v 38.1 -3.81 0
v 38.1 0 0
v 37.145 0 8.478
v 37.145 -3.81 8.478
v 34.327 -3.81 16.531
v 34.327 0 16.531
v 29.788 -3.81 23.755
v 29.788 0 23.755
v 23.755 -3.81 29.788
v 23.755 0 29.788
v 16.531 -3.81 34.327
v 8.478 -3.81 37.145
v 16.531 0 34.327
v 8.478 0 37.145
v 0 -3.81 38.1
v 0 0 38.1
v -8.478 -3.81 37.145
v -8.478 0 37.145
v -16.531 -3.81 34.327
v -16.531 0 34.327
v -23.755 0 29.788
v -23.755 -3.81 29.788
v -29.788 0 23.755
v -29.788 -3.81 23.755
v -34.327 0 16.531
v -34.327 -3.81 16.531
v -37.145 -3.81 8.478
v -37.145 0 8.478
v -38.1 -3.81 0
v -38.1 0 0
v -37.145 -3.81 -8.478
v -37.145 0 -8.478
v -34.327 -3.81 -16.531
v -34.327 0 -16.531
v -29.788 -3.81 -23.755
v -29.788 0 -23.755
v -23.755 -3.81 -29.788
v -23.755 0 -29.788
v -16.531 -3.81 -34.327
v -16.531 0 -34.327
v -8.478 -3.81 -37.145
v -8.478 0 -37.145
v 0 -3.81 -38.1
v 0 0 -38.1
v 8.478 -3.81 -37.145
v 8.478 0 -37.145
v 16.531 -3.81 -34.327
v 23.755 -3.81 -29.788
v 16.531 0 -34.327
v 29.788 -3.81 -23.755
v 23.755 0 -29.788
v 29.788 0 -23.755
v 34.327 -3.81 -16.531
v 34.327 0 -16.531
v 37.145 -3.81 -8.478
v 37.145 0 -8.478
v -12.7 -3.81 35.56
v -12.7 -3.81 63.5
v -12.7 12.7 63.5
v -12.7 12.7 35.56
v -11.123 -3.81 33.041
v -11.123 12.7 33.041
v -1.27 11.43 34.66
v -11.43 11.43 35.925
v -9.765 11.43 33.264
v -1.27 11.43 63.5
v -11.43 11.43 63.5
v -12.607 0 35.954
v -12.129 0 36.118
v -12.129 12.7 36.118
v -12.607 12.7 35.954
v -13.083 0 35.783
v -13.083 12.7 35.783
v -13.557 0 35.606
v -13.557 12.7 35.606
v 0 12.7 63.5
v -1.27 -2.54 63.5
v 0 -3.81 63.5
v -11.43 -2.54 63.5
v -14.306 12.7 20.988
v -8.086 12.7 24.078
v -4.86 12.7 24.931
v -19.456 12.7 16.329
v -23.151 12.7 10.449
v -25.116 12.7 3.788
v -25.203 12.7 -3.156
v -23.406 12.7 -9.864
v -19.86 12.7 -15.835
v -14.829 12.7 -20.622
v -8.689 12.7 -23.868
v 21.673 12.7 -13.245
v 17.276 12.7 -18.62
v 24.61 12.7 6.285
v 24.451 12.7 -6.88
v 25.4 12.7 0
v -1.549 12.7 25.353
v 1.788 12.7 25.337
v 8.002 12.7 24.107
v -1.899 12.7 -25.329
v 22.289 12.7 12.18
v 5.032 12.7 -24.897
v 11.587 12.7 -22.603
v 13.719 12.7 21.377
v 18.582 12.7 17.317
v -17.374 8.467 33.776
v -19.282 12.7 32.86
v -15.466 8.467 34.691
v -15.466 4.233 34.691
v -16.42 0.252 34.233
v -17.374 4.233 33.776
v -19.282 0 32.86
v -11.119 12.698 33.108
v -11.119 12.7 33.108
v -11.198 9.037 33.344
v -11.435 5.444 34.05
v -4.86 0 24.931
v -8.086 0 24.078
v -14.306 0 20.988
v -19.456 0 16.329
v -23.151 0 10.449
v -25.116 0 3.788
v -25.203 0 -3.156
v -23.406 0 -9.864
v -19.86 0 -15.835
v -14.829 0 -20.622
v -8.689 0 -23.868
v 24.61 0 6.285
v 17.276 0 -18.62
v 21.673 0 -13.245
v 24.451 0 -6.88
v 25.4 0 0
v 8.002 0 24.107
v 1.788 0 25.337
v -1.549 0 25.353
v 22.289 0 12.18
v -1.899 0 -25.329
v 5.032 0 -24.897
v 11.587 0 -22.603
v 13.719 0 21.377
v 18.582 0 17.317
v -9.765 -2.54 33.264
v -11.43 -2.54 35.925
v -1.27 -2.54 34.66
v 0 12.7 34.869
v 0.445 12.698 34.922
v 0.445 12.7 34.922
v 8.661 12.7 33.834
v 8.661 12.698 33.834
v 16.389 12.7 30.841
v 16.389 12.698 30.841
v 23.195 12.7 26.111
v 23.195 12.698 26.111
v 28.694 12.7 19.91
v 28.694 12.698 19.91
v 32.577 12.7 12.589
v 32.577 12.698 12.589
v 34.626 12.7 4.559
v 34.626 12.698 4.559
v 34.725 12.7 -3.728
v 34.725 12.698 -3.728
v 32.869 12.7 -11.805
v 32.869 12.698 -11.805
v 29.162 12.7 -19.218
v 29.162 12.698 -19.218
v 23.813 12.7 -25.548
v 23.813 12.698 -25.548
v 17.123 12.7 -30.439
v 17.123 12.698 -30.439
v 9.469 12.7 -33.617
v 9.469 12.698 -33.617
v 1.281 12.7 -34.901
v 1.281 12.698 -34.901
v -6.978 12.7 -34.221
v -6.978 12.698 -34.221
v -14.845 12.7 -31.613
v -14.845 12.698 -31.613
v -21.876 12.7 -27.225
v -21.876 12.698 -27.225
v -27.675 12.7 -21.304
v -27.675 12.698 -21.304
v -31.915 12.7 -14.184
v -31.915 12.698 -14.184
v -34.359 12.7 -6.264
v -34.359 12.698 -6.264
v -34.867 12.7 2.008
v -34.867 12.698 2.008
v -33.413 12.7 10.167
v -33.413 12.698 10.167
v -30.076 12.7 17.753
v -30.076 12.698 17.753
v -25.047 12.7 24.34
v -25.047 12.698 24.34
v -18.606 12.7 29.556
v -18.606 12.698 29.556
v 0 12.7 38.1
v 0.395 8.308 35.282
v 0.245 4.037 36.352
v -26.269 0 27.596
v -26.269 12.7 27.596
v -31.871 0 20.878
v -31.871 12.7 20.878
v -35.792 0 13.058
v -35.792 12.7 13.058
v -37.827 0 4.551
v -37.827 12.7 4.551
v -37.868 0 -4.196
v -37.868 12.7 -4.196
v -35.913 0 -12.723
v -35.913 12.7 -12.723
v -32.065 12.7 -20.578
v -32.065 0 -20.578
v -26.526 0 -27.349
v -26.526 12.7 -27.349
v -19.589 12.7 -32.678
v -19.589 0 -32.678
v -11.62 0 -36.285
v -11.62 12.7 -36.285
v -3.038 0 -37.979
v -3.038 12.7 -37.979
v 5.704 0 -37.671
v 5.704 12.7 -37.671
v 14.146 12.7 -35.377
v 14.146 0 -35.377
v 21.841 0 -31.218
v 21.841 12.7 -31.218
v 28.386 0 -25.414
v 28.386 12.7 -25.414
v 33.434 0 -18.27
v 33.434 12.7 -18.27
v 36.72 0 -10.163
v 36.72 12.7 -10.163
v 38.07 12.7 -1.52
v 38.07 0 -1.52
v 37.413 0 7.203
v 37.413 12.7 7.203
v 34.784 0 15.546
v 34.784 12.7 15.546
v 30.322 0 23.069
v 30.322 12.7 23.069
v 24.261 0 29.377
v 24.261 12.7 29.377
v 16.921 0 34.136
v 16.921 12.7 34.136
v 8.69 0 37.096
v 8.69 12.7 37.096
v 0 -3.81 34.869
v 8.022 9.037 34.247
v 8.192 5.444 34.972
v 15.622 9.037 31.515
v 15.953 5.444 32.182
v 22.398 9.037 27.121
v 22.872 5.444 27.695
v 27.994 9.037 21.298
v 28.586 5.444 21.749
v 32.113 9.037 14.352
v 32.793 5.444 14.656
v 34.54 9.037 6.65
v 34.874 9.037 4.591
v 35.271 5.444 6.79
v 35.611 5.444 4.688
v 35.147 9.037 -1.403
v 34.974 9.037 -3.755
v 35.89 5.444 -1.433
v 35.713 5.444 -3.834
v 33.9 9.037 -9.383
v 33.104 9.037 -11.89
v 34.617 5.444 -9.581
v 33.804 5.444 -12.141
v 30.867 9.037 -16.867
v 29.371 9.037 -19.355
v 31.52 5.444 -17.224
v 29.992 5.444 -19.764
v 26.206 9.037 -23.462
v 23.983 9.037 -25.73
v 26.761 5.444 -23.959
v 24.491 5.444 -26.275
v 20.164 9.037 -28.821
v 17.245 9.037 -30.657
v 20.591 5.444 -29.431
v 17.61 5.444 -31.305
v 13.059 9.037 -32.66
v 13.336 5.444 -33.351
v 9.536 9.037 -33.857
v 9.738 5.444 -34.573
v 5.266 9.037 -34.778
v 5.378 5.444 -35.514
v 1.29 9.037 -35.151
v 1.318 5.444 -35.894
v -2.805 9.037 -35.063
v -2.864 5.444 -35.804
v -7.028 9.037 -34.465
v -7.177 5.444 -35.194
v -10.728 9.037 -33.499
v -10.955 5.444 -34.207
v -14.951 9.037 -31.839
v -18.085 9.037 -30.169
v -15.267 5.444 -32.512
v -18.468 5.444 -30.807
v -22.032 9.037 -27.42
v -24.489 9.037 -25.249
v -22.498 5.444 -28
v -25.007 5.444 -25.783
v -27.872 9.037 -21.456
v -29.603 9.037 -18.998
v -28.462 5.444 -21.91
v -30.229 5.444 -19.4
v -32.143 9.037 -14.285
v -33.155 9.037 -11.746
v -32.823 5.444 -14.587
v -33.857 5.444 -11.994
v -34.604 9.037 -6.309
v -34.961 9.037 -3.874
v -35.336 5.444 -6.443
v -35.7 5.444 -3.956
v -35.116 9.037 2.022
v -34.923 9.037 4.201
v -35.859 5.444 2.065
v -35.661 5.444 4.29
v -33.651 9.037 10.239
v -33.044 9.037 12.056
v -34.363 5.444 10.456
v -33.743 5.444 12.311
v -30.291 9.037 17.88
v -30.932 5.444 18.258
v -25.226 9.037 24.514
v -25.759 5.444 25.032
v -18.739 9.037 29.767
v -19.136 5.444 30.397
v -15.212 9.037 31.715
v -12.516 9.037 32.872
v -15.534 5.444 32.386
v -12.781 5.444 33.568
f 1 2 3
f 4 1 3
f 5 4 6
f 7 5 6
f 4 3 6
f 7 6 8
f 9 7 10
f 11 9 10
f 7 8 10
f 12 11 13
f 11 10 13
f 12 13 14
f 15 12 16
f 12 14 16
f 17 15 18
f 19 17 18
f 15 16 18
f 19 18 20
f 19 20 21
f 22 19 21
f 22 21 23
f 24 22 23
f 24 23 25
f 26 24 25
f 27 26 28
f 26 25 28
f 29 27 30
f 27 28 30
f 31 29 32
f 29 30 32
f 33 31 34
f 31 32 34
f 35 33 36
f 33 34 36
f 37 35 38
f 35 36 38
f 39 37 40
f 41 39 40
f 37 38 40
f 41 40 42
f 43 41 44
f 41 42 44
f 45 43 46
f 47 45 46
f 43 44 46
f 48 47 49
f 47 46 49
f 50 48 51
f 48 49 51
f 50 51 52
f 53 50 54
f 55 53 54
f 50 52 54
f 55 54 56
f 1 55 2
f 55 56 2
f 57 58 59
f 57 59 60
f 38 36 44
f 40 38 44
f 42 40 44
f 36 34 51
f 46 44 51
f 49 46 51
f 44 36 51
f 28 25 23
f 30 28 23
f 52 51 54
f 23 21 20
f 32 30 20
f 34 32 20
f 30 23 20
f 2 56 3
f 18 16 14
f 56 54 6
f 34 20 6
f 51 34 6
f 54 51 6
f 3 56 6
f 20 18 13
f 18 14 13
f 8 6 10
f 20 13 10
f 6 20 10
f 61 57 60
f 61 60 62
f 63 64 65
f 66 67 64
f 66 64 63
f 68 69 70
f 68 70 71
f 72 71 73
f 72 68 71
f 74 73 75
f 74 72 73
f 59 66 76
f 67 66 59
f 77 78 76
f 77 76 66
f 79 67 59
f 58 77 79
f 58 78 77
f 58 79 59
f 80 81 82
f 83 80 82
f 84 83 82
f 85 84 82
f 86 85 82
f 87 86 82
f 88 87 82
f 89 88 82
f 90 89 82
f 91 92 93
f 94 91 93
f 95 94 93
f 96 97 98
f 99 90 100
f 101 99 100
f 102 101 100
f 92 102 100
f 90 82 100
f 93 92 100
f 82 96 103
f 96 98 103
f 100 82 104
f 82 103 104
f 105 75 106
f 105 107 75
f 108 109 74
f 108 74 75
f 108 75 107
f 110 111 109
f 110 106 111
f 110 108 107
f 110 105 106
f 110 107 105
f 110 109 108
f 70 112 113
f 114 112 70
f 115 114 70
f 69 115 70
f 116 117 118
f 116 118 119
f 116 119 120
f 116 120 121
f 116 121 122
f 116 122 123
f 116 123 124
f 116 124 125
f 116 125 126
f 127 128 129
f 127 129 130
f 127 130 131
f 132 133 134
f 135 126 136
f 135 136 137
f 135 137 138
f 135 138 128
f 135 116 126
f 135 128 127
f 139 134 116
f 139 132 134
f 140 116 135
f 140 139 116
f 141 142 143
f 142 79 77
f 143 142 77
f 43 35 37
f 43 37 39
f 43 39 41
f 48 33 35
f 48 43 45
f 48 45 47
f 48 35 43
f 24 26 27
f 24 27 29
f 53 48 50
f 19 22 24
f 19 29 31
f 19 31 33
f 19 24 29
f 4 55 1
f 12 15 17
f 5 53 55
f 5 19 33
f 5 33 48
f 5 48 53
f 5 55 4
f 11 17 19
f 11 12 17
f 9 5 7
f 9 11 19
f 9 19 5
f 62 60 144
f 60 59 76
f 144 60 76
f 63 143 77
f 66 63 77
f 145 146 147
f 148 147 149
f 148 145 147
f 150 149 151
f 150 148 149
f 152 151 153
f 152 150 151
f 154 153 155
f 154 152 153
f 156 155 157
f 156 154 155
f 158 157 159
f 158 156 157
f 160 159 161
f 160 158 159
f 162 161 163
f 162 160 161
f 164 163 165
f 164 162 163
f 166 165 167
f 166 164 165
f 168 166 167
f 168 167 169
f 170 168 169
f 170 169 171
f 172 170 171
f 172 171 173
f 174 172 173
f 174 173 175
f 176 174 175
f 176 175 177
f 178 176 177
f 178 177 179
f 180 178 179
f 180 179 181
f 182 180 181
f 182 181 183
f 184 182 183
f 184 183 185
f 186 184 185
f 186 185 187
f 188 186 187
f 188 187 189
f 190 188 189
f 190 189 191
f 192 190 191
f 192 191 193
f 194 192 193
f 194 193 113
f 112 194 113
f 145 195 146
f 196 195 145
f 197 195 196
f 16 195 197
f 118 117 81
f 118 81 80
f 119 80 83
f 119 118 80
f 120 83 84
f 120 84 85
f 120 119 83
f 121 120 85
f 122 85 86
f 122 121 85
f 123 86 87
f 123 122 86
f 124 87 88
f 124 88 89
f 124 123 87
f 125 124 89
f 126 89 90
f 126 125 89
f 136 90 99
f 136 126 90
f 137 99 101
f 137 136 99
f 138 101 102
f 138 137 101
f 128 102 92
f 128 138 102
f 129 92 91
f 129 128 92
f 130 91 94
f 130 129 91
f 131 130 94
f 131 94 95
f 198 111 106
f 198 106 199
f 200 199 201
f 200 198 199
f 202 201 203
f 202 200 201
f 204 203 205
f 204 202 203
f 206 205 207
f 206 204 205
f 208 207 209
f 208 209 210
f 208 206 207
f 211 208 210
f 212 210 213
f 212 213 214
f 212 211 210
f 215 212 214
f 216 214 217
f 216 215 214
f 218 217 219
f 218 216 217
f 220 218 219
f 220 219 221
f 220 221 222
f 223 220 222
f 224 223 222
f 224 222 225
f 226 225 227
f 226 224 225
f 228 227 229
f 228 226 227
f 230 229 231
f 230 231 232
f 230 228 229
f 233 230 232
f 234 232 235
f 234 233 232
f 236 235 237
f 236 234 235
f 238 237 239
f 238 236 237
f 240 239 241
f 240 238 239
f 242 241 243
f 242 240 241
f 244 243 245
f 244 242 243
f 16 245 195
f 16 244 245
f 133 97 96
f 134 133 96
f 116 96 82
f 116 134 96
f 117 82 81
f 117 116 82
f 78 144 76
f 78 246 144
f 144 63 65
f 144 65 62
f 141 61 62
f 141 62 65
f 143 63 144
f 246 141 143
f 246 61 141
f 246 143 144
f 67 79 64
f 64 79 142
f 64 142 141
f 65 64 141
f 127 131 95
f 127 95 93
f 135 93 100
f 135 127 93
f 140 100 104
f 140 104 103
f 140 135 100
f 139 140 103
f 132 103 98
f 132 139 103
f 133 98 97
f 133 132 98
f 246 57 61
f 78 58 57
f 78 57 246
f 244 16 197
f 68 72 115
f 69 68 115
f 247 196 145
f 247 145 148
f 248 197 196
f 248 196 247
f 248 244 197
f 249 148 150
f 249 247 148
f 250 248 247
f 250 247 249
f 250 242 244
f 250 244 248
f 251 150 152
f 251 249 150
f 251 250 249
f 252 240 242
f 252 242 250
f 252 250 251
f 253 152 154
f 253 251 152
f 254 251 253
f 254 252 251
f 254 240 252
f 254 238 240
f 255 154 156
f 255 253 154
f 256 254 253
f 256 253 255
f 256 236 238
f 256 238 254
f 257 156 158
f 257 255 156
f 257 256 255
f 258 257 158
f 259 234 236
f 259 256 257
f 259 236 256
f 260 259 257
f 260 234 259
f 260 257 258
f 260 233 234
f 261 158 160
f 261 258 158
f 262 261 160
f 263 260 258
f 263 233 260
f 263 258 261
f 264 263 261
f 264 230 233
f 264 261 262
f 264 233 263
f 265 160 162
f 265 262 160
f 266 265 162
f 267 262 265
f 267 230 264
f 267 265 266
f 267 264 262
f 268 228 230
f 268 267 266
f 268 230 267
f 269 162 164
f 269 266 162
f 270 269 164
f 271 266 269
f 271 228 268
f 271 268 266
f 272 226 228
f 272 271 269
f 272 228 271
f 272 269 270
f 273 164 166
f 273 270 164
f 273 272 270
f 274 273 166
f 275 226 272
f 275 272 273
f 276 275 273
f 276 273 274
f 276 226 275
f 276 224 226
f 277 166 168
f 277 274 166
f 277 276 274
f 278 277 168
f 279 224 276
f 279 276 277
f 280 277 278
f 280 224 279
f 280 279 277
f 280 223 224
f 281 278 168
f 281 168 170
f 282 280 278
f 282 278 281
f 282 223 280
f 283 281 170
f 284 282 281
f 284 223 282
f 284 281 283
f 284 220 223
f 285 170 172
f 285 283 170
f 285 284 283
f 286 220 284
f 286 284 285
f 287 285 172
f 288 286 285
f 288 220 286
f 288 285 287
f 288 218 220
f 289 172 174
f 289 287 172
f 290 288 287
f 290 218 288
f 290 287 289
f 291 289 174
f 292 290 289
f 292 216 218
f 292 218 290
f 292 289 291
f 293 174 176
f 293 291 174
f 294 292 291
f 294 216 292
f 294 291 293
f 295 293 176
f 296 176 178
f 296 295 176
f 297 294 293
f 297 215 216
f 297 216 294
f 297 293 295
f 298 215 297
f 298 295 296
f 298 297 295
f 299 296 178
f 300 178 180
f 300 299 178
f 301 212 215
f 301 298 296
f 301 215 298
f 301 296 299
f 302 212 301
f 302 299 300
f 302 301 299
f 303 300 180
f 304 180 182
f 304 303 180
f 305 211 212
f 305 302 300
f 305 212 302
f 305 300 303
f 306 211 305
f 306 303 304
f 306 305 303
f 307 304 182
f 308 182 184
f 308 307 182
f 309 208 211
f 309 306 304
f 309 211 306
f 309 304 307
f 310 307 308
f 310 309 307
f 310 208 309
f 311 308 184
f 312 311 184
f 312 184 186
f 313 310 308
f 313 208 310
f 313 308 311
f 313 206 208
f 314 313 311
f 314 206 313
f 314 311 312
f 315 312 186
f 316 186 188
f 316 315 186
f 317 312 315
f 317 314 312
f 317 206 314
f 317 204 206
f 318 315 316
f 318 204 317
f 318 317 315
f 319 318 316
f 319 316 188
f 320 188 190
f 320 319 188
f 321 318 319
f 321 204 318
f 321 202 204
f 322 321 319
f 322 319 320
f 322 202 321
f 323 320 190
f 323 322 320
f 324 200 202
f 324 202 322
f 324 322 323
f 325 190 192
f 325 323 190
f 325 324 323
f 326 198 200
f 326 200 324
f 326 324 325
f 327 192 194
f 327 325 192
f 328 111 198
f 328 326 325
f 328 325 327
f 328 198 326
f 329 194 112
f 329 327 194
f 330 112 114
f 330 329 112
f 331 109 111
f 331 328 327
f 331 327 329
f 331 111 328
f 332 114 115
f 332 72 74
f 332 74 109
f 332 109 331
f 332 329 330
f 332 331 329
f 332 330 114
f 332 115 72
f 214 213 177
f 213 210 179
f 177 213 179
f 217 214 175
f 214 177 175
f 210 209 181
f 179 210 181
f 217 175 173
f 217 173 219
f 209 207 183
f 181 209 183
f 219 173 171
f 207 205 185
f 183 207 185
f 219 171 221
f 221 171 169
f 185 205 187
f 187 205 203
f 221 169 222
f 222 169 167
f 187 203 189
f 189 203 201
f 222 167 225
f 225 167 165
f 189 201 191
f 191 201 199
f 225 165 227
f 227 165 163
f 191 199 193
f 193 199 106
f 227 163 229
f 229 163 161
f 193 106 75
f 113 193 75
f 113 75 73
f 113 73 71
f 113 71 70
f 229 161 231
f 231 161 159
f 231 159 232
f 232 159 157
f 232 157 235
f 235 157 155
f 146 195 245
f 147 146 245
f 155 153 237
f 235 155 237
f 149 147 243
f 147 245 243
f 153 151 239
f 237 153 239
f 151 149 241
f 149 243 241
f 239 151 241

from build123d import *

# Parameters (mm, degrees)
F1_DEPTH      = 12.7
F2_R          = 38.1
F3_DEPTH      = 3.81
F4_T2_ANGLE   = 359.64
F6_DEPTH      = 3.81
F6_DEPTH_BACK = 12.7
F7_T          = -1.27


# Not quite as in the source:
# - a fillet or chamfer that OpenCascade refuses, or shapes differently, is made with other operations: its cross-section is extruded or revolved along the edge and cut away or added


with BuildPart() as f1:
    # F0 (on Front) → F1 (new body)
    with BuildSketch(Plane.XZ):
        with BuildLine():
            ThreePointArc((-8.0861902234, 24.0784868227), (-14.8285327717, -20.6221874649), (25.4, 0))
            ThreePointArc((25.4, 0), (18.5819114233, 17.3168290358), (1.787986783, 25.3369908092))
            ThreePointArc((1.787986783, 25.3369908092), (-3.2113548099, 25.1961743184), (-8.0861902234, 24.0784868227))
        make_face()
    extrude(amount=-F1_DEPTH)


with BuildPart() as f1b:
    # F0 (on Front) → F1, piece 2 (new body)
    with BuildSketch(Plane.XZ):
        with BuildLine():
            Line((0, 38.1), (0.4451874458, 34.9221624923))
            ThreePointArc((0.4451874458, 34.9221624923), (5.4132089756, -34.5029389123), (-11.1185115572, 33.1079193812))
            Line((-11.1185115572, 33.1079193812), (-12.1292853351, 36.1177302341))
            ThreePointArc((-12.1292853351, 36.1177302341), (-12.8456964833, 35.8691801113), (-13.5570191026, 35.6064212334))
            add(Edge.make_bspline(
                [(-13.5570191026, 35.6064212334), (-15.4655091495, 34.6910286845), (-17.3739991965, 33.7756361356), (-19.2824892434, 32.8602435867)],
                knots=[0, 0, 0, 0, 6.35, 6.35, 6.35, 6.35], degree=3))
            ThreePointArc((-19.2824892434, 32.8602435867), (9.9908638101, -36.7667327938), (0, 38.1))
        make_face()
    extrude(amount=-F1_DEPTH)

    # F4: fillet of radius 26.9812507731 on 1 edges, made by hand

    # F4_s1 → F4_t2 (revolve, cut)
    with BuildSketch(Plane(origin=(0, 0, 0), x_dir=(0, 1, 0), z_dir=(-0.9883972718, 0, -0.1518908593))):
        with BuildLine():
            ThreePointArc((12.6984375972, -34.925), (6.1537652905, -35.7307821492), (0, -38.1))
            Line((0, -38.1), (-0.2539687519, -37.6238749845))
            ThreePointArc((-0.2539687519, -37.6238749845), (-0.5396250155, -36.5125), (-0.5396250155, -34.925))
            Line((-0.5396250155, -34.925), (0, -34.3853749845))
            Line((0, -34.3853749845), (12.6984375972, -34.3853749845))
            Line((12.6984375972, -34.3853749845), (12.6984375972, -34.925))
        make_face()
    revolve(axis=Axis((0, 0, 0), (0, 1, 0)), revolution_arc=F4_T2_ANGLE, mode=Mode.SUBTRACT)


with BuildPart() as f3:
    # F2 (on Front) → F3 (new body)
    with BuildSketch(Plane.XZ):
        Circle(F2_R)
    extrude(amount=F3_DEPTH)


with BuildPart() as f6:
    # F5 (on Front) → F6 (new body, two sides)
    with BuildSketch(Plane.XZ) as f6_sk:
        Polygon((-12.7, 35.56), (0, 38.1), (0, 63.5), (-12.7, 63.5), align=None)
        Polygon((-11.1233824864, 33.0410040915), (0, 34.8688024059), (0, 38.1), (-12.7, 35.56), align=None)
    extrude(amount=F6_DEPTH)
    extrude(f6_sk.sketch, amount=-F6_DEPTH_BACK)

    # F7
    f7_openings = [f6.faces().sort_by_distance(p)[0] for p in [
        (-6.35, 4.445, 63.5),
        (-5.561691, 4.445, 33.954903),
    ]]
    offset(amount=F7_T, openings=f7_openings)


solid = Compound([f1.part, f1b.part, f3.part, f6.part])
